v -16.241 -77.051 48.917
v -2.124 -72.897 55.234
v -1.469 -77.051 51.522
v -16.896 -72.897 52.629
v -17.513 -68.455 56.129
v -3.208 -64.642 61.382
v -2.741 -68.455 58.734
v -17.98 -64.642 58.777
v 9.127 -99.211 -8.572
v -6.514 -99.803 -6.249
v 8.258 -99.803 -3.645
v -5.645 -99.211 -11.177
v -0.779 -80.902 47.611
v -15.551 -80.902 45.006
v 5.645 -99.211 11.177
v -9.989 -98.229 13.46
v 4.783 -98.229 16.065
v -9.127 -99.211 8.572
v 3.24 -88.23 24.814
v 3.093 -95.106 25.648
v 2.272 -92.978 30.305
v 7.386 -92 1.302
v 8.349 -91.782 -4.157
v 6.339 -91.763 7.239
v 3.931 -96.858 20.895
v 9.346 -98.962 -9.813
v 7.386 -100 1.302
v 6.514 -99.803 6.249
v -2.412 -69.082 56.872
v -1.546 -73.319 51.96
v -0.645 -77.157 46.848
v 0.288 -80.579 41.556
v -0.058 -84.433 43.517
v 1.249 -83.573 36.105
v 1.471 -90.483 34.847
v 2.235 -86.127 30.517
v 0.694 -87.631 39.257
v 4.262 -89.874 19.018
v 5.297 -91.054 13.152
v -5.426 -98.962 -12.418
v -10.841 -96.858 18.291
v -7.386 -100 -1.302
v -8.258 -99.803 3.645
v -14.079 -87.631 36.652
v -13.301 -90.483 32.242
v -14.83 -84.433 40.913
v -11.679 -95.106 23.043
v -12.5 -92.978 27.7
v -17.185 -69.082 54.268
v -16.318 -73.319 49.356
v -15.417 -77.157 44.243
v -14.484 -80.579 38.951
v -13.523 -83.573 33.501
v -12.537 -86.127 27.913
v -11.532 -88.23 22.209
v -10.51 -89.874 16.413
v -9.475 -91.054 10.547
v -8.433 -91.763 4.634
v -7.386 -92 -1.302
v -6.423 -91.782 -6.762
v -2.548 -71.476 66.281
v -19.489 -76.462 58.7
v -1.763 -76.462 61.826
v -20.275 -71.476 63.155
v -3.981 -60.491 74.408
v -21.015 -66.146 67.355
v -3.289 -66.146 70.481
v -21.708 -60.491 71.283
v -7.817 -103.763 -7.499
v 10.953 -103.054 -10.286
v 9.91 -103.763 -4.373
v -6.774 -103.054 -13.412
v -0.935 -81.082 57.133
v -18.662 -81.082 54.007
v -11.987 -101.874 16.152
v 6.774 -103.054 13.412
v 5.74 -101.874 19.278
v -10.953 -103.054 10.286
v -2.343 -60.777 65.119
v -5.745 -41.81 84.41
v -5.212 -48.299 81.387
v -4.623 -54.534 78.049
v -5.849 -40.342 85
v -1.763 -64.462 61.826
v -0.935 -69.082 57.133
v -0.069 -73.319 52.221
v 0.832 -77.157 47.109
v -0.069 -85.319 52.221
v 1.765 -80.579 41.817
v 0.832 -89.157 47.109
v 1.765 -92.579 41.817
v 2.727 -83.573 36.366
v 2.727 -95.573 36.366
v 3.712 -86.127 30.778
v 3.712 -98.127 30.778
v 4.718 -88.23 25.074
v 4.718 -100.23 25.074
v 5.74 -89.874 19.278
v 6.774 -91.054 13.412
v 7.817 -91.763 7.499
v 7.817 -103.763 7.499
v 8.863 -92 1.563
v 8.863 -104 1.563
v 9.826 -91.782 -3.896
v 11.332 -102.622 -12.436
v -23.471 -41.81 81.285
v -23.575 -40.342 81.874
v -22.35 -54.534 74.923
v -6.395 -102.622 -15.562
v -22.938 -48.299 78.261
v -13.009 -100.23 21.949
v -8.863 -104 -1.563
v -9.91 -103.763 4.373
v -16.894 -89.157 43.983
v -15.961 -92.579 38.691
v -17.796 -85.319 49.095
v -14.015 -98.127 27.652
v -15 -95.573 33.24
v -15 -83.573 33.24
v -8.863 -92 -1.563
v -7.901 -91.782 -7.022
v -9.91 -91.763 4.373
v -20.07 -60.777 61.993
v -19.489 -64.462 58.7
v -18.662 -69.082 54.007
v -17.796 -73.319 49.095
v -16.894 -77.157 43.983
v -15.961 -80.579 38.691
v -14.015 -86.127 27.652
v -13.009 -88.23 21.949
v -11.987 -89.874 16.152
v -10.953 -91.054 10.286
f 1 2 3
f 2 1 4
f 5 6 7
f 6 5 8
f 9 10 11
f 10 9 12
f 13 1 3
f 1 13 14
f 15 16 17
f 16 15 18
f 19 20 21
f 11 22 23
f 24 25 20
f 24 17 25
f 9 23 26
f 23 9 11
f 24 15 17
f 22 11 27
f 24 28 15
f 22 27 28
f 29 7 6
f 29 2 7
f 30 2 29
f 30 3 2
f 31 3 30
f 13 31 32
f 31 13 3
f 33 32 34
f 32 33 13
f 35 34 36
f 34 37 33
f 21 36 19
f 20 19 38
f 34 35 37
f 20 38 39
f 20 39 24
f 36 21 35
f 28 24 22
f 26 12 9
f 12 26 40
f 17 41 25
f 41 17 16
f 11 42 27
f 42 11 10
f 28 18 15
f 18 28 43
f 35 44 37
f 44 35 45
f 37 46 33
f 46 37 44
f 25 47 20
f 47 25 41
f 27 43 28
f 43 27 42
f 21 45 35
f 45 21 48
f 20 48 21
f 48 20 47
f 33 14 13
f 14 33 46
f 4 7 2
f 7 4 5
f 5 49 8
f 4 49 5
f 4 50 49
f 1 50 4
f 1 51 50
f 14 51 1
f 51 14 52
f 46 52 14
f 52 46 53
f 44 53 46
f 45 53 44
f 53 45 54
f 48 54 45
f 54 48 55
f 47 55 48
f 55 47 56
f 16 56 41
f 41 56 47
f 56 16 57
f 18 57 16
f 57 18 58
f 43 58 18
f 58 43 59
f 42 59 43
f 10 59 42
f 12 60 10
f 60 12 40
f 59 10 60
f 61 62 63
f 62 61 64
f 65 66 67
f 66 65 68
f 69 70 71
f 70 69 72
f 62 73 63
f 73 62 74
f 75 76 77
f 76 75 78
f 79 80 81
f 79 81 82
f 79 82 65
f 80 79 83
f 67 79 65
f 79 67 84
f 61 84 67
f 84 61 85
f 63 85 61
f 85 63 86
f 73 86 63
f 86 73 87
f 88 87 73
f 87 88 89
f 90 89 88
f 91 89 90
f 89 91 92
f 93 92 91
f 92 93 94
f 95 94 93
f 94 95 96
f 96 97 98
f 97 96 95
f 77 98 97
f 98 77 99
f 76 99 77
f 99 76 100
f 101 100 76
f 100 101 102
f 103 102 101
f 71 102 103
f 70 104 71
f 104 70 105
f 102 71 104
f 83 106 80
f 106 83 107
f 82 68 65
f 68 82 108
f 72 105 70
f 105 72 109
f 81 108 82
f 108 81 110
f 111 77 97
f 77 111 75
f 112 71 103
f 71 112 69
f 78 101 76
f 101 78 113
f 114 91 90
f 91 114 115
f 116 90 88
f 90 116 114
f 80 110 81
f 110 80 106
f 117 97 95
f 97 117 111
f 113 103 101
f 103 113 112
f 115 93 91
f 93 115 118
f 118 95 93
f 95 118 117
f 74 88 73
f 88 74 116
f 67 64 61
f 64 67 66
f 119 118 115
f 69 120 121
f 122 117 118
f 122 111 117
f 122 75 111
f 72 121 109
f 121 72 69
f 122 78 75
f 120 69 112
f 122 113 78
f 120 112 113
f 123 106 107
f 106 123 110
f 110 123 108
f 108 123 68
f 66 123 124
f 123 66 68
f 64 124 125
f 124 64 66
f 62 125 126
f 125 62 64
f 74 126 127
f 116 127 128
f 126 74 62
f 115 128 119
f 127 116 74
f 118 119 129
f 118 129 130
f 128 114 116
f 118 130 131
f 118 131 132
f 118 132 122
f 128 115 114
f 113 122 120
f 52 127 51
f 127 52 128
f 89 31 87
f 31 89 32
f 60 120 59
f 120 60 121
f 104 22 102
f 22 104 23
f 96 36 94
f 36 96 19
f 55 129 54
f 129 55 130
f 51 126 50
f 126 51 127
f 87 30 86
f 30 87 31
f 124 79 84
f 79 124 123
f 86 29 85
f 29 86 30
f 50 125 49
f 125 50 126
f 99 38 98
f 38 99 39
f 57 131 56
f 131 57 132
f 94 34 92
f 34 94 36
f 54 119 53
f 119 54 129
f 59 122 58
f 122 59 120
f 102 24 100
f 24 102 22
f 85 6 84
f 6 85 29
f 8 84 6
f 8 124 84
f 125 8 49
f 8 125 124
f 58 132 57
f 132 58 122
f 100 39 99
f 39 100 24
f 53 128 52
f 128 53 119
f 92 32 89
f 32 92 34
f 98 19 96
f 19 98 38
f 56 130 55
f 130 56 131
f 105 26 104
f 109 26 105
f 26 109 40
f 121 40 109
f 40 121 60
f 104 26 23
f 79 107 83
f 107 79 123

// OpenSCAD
// USAGE: MODIFY SCALE TO MATCH THE Curvature
tbScaleX = 0.8;
tbScaleY = 1.0;
tbScaleZ = 1.0;

// Draw Curve Module
rotate([0, 80, 0])
tubeCurve(tbScaleX, tbScaleY, tbScaleZ);


/* Create Tube Curve */
module tubeCurve(sX, sY, sZ) {
	cylRes = 100;
	cylHeight = 15;
	cylRadius = 100;
	scale([sX, sY, sZ])
	difference() {
		    difference()  {
				// INNER RADIUS CUT-OUT
				translate([0, 16, 0])
				scale(1.2, 1.0, 1.5)
				difference() {
					cylinder(r = cylRadius, h = cylHeight, center = true, $fn=cylRes);
					translate([0, cylRadius/10, 0])	
					cylinder(r = cylRadius, h = cylHeight, center = true, $fn=cylRes );	
			     }
				// MAIN CYLINDER Curvature
				difference() {
					cylinder(r = cylRadius, h = cylHeight, center = true, $fn=cylRes);
					translate([0, cylRadius/10, 0])	
					cylinder(r = cylRadius, h = cylHeight, center = true, $fn=cylRes);	
			     }
		    }
		    // Clip Tube Curve via cube
		    rotate([0, 0, -45])
		    translate([-1.5 * cylRadius, -0.6 * cylRadius, -cylHeight])
		    cube([3 * cylRadius, 2*cylRadius, 2 * cylHeight]);
			
			// Clips flat edge on end
		    rotate([0, 0, -39])
		    translate([-2.15 * cylRadius, -0.98 * cylRadius, -cylHeight])
		    cube([2 * cylRadius, 0.7 * cylRadius, 2 * cylHeight]);
		    // Smooths bottom edge
			for (i=[0:18]) {
		   	 	rotate([0, 0, -1 * (i + 50) ])
			    translate([0.6 * cylRadius, -1.0 * cylRadius, -cylHeight])
			    cube([cylRadius / 9, 0.1 * cylRadius, 2 * cylHeight]);
			}

	}
}
